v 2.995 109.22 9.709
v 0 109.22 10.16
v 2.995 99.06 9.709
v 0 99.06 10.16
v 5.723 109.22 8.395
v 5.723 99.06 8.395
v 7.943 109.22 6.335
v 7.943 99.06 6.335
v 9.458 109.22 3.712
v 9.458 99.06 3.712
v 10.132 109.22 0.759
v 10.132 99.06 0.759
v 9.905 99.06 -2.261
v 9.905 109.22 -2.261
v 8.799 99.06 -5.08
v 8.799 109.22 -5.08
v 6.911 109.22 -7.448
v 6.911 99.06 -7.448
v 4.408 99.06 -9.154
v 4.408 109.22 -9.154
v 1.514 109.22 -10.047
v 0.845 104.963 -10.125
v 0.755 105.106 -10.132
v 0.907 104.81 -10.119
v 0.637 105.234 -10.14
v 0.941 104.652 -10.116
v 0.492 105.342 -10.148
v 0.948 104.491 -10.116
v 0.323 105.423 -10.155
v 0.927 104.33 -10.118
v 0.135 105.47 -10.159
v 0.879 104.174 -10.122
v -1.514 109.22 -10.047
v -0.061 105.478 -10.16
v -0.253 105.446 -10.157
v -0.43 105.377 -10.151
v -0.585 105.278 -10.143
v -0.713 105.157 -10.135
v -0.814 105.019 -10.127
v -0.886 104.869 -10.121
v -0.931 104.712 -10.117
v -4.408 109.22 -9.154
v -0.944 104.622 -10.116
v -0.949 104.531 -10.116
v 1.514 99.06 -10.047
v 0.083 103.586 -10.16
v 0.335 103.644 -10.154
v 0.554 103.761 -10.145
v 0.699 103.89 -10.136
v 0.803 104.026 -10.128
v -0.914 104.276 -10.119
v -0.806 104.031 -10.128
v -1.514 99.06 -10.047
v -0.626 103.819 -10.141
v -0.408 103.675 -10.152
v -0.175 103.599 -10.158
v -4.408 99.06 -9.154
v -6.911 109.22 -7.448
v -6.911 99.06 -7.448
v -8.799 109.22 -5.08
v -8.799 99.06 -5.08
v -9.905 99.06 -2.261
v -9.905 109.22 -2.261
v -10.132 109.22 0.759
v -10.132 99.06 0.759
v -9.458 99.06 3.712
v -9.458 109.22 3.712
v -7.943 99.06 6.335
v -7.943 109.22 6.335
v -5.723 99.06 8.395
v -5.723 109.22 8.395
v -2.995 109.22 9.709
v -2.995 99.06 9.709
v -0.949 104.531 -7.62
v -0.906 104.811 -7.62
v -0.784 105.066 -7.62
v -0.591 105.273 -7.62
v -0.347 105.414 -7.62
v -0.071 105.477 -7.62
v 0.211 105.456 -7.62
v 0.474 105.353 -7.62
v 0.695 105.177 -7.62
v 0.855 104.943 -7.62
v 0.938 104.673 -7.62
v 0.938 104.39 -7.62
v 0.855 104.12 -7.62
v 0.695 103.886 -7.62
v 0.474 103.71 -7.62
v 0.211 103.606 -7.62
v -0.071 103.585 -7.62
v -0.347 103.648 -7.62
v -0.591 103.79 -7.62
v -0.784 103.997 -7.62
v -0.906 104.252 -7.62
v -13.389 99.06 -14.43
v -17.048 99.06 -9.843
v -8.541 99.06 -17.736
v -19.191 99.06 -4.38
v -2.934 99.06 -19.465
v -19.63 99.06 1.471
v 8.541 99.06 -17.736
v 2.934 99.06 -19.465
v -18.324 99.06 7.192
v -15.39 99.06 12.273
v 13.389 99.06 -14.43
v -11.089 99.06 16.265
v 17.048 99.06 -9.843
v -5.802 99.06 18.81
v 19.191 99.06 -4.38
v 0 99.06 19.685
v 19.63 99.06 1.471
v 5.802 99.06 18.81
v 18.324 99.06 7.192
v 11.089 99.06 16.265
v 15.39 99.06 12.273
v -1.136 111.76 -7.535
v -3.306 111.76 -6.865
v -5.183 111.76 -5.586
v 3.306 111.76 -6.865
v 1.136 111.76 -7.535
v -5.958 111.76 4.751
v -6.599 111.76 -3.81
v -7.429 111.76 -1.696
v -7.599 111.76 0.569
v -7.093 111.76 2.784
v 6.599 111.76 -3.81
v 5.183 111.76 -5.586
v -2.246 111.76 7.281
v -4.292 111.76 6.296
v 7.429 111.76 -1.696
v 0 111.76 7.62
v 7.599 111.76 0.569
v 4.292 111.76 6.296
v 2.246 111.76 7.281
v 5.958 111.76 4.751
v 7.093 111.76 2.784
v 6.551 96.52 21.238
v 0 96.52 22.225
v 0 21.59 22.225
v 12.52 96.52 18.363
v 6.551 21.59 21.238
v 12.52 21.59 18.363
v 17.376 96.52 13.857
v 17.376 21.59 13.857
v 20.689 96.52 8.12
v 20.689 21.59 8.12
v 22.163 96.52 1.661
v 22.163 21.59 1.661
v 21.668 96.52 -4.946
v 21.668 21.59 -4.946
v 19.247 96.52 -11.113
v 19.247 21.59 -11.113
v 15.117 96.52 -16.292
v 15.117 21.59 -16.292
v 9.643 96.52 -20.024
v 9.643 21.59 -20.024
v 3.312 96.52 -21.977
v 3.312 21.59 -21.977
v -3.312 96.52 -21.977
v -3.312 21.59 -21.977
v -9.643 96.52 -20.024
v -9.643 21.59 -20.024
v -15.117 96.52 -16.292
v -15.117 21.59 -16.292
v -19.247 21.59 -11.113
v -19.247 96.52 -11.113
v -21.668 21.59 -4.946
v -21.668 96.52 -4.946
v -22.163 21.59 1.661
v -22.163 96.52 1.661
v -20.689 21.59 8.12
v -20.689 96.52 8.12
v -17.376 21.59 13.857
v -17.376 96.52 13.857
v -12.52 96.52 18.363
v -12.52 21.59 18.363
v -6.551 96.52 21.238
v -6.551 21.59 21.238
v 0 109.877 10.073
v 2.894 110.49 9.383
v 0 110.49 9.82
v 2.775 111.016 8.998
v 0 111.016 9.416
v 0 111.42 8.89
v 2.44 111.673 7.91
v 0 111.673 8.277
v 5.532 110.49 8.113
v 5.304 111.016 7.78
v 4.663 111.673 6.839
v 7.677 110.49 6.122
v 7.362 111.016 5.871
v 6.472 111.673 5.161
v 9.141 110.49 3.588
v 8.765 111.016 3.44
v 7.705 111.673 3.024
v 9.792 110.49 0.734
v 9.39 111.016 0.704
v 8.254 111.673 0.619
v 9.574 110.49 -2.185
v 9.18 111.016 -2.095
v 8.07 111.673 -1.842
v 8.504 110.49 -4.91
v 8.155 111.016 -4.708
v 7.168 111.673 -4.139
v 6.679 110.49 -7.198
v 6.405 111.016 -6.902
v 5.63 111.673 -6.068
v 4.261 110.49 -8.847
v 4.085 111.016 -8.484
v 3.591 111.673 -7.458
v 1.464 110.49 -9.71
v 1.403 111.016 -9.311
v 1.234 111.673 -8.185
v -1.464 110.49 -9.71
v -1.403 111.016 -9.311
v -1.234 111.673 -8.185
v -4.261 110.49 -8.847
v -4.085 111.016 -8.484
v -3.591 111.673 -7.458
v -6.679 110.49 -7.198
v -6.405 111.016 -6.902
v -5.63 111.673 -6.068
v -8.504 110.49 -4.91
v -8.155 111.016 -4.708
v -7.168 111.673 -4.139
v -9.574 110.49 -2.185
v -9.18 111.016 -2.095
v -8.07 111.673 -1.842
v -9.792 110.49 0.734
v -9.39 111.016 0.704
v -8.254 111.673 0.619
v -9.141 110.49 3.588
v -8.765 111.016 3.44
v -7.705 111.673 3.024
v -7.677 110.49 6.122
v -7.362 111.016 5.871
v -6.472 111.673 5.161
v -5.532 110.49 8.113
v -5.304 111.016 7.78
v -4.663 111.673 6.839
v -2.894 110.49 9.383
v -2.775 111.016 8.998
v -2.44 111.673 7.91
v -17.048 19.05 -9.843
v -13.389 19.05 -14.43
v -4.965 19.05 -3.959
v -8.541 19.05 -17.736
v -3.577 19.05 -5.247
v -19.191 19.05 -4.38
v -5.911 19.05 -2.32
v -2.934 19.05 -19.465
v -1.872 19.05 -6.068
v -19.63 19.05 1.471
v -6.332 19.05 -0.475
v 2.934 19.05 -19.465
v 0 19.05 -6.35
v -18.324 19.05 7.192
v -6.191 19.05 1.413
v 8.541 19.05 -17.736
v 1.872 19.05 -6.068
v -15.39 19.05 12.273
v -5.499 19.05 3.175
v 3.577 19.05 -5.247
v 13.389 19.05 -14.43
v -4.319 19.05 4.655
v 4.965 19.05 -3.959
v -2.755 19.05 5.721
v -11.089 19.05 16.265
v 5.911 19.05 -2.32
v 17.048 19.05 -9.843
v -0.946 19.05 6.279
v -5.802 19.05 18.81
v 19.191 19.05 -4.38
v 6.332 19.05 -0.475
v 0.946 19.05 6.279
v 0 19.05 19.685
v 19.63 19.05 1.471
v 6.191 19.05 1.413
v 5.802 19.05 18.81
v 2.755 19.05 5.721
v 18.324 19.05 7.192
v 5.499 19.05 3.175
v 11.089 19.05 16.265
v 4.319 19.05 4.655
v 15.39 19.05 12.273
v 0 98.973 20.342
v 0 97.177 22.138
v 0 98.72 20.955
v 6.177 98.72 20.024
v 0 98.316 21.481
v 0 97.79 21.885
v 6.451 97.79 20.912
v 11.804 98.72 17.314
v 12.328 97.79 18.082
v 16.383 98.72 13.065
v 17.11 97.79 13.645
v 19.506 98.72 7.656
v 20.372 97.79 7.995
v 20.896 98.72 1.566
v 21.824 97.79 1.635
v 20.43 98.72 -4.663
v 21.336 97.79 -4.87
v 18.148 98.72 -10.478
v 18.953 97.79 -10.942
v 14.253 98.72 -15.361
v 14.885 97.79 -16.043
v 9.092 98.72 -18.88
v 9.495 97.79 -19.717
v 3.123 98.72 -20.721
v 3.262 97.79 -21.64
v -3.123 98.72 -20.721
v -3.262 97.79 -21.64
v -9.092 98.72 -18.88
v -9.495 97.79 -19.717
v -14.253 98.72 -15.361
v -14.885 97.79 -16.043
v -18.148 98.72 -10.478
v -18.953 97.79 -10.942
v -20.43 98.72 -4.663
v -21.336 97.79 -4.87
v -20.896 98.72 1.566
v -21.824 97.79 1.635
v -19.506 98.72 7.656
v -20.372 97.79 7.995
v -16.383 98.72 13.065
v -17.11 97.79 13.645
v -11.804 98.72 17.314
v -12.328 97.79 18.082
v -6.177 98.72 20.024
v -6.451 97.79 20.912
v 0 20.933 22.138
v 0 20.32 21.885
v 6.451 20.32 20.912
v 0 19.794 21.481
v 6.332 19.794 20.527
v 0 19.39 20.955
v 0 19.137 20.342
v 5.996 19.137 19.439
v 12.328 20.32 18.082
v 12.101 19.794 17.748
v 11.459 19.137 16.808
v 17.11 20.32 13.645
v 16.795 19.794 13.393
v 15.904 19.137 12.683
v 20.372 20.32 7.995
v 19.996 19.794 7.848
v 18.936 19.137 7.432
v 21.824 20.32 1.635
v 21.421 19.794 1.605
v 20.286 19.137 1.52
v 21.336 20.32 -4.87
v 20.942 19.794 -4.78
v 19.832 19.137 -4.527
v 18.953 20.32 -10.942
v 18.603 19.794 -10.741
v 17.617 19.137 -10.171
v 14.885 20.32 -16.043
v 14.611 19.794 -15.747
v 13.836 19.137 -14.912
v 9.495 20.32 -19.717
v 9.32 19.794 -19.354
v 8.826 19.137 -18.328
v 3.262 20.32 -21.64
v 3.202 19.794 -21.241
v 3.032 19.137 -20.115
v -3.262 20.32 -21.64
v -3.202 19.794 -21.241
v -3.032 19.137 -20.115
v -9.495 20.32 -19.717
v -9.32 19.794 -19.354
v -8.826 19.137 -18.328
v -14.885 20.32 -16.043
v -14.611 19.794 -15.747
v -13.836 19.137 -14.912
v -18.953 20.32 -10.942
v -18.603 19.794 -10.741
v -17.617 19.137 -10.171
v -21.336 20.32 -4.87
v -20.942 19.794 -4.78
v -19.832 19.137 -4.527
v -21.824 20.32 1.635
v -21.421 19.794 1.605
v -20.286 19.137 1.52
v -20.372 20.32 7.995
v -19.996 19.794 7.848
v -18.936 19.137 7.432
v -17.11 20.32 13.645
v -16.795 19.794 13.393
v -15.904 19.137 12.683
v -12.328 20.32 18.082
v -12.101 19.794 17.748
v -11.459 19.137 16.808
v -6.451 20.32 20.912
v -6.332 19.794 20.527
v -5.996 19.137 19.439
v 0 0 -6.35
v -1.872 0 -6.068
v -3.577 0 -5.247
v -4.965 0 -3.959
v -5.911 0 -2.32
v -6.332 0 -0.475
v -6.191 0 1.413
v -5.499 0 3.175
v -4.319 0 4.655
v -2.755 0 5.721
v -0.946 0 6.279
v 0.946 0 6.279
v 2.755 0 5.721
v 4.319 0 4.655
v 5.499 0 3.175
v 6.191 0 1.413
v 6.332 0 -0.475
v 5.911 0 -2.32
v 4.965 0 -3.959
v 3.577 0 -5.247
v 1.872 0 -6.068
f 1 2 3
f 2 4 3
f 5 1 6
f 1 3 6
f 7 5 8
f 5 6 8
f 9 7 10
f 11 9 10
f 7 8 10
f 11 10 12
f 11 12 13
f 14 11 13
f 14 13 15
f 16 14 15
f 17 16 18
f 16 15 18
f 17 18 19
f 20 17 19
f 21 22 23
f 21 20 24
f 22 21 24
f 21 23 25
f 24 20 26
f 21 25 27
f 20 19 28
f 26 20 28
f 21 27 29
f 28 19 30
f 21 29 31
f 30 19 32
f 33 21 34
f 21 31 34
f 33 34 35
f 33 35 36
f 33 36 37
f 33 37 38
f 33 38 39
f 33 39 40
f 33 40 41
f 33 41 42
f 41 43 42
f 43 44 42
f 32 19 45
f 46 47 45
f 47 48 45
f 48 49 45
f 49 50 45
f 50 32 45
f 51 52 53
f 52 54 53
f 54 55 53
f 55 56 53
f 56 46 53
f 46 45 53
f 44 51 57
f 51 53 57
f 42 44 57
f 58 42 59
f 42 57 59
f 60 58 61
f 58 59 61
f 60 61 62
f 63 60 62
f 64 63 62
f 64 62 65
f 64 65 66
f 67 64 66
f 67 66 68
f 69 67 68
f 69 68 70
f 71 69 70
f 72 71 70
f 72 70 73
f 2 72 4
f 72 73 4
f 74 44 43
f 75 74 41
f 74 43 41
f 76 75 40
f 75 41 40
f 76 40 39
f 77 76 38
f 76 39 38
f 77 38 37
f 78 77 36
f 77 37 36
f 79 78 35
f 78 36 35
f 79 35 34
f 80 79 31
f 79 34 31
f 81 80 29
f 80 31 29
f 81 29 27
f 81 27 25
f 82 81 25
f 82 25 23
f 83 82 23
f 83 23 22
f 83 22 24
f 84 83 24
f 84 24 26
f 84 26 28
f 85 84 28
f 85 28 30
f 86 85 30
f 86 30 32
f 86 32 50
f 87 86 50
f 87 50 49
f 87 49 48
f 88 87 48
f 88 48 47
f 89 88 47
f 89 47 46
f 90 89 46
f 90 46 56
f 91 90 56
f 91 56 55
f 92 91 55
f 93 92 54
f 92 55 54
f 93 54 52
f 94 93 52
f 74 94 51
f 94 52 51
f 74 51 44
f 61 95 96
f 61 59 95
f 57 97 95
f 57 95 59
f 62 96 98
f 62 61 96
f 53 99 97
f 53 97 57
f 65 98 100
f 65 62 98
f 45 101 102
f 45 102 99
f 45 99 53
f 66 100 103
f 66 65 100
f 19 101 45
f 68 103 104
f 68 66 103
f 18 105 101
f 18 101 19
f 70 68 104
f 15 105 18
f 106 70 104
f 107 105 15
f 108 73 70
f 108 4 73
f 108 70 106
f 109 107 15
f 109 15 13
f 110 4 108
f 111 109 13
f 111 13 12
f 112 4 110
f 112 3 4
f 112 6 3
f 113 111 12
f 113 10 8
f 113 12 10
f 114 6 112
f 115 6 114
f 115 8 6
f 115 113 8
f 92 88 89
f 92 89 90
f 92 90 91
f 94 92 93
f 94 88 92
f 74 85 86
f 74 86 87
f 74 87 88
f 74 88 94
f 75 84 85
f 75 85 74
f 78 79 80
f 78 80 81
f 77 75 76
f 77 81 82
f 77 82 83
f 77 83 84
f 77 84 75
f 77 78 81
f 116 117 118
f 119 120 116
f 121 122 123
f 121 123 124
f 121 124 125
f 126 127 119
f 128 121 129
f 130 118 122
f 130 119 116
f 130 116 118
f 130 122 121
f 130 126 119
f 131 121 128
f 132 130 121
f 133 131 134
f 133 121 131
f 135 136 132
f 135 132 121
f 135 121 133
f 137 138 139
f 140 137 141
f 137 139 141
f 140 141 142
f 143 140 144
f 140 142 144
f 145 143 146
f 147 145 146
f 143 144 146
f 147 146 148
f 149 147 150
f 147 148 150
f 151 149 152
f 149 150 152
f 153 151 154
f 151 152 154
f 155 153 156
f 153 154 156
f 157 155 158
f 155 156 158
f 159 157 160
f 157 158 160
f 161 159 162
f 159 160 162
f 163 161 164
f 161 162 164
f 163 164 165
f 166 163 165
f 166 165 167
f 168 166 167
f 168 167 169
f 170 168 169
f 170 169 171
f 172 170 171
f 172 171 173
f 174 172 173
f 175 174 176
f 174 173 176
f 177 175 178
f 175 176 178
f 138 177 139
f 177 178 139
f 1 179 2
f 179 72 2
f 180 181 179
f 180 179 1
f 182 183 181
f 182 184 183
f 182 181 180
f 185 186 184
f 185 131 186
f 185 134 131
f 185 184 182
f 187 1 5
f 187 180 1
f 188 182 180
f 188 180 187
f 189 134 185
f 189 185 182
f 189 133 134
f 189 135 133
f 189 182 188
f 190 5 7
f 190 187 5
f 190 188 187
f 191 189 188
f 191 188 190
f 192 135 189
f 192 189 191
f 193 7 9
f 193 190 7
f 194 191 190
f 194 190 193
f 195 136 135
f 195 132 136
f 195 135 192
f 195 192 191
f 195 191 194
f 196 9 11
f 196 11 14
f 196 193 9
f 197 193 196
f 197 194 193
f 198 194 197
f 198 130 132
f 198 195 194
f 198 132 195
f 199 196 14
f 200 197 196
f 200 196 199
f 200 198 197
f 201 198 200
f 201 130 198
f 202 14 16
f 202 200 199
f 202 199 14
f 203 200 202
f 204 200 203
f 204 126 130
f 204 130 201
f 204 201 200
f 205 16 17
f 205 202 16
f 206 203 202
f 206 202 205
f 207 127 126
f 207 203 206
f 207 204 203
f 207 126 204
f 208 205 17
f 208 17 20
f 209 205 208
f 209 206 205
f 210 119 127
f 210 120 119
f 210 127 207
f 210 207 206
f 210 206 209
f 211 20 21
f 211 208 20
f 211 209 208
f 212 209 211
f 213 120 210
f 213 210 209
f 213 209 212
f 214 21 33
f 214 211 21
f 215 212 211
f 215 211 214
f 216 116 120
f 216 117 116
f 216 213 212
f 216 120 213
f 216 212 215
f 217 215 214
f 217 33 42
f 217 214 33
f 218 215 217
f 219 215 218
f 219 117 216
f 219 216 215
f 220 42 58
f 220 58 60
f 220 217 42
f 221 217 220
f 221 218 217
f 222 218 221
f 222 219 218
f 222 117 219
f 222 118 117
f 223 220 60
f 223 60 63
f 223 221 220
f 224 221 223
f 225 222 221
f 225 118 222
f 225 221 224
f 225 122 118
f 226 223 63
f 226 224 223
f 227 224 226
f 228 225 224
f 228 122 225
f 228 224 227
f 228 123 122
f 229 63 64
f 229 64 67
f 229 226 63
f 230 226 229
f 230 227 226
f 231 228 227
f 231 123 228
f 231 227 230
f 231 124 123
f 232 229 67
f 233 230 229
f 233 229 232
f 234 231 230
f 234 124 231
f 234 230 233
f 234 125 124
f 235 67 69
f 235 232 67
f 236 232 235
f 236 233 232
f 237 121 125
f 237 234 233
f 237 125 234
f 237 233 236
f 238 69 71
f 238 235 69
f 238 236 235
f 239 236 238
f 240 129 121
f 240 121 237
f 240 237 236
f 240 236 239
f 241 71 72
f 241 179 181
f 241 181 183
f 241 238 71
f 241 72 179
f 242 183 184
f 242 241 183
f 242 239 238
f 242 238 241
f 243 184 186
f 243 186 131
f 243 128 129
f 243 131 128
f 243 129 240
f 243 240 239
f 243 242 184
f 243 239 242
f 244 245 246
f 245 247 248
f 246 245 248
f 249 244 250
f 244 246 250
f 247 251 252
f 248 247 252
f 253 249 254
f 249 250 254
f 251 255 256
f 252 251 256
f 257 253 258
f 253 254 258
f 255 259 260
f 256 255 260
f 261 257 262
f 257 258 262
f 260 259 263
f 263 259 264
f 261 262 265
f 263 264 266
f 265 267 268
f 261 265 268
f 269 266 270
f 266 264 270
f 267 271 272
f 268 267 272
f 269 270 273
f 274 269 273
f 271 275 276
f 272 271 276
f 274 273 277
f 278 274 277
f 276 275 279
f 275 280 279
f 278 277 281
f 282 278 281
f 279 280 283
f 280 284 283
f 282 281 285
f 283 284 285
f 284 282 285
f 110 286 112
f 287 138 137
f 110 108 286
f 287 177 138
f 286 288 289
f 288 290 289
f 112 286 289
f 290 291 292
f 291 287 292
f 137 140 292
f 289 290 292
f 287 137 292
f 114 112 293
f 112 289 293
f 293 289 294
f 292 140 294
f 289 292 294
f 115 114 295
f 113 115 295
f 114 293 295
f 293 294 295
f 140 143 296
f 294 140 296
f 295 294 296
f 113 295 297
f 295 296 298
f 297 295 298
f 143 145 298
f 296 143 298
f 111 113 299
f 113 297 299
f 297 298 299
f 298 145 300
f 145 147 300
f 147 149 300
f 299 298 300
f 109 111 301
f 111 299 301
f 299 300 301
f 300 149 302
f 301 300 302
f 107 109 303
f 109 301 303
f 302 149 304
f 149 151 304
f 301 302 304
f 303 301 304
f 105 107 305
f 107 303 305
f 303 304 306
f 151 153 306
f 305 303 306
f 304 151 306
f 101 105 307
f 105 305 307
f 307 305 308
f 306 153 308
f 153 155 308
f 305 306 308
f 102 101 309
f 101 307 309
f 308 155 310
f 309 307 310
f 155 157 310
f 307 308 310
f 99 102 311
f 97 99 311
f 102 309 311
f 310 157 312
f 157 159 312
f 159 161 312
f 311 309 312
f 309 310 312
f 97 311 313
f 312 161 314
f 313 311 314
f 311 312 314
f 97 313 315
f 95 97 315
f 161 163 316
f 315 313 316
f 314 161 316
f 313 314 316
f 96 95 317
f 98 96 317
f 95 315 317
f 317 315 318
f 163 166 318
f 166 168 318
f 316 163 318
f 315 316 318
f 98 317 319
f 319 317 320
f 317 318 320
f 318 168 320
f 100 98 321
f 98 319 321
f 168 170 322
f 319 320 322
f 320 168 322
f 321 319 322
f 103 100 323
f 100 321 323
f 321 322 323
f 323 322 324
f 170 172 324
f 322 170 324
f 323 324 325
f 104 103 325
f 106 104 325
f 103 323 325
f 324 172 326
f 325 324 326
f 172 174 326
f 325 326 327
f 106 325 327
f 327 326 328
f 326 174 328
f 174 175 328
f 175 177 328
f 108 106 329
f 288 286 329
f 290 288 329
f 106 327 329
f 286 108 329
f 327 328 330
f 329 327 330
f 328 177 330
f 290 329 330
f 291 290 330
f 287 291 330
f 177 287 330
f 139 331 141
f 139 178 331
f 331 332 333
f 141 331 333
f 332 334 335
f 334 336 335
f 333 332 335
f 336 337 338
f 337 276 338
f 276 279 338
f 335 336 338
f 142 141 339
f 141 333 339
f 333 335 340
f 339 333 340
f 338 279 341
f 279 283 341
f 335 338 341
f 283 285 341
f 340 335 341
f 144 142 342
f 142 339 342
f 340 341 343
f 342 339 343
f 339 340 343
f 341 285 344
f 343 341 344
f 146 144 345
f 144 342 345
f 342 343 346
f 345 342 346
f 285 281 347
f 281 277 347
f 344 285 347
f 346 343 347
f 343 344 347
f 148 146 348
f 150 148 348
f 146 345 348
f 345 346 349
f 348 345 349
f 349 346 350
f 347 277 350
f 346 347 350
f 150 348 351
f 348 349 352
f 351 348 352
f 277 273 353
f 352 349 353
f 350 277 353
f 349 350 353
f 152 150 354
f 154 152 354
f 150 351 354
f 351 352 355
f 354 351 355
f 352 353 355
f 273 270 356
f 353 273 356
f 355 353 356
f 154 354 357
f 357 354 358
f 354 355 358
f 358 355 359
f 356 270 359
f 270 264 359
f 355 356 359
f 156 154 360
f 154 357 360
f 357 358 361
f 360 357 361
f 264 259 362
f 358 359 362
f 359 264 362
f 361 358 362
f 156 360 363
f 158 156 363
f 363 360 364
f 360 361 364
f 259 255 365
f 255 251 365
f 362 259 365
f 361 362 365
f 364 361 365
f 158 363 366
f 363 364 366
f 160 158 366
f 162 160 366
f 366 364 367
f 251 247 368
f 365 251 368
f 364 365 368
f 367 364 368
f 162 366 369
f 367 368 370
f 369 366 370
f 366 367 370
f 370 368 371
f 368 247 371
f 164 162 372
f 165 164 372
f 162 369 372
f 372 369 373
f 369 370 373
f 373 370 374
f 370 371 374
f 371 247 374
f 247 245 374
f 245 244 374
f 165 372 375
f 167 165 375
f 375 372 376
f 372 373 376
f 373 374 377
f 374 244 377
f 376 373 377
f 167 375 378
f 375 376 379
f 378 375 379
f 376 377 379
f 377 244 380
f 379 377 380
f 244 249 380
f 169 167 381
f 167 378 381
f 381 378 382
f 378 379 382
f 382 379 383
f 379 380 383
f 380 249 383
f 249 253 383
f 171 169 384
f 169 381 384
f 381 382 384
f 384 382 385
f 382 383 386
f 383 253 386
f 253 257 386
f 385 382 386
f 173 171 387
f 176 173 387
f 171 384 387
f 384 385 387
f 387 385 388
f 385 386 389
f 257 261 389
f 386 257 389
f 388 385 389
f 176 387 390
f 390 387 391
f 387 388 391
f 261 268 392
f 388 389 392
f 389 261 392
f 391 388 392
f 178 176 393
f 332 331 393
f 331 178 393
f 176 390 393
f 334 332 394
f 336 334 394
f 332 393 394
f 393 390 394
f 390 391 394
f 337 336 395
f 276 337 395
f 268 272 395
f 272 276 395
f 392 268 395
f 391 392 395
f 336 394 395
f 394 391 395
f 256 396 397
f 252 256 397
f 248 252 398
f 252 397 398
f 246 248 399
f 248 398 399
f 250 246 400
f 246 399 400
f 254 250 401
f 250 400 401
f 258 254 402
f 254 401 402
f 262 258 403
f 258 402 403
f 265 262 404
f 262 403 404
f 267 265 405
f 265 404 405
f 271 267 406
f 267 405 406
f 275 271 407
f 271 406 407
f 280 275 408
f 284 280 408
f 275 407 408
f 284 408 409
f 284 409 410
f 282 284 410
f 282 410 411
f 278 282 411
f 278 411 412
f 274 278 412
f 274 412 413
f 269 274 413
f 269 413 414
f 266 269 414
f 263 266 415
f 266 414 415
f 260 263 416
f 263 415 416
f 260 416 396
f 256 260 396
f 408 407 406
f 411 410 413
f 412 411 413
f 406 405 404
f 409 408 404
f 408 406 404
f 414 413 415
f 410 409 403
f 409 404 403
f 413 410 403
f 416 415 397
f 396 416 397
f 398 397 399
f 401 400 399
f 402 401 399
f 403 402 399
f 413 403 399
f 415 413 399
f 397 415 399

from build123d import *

# Parameters (mm, degrees)
SKETCH1_R           = 6.35
BOSS_EXTRUDE1_DEPTH = 19.05
SKETCH3_R           = 22.225
BOSS_EXTRUDE2_DEPTH = 80.01
SKETCH4_R           = 10.16
BOSS_EXTRUDE3_DEPTH = 12.7
FILLET2_R           = 2.54
FILLET3_R           = 2.54
FILLET4_R           = 2.54
SKETCH5_R           = 0.948603759
CUT_EXTRUDE1_DEPTH  = 2.54


with BuildPart() as part:
    # Sketch1 → Boss-Extrude1 (new body)
    with BuildSketch(Plane(origin=(0, 0, 0), x_dir=(1, 0, 0), z_dir=(0, 1, 0))):
        with Locations(Location((0, 0, 0), (0, 0, 90))):
            Circle(SKETCH1_R)
    extrude(amount=BOSS_EXTRUDE1_DEPTH)

    # Sketch3 → Boss-Extrude2 (add)
    with BuildSketch(Plane(origin=(0, 19.05, 0), x_dir=(1, 0, 0), z_dir=(0, 1, 0))):
        with Locations(Location((0, 0, 0), (0, 0, 270))):
            Circle(SKETCH3_R)
    extrude(amount=BOSS_EXTRUDE2_DEPTH)

    # Sketch4 → Boss-Extrude3 (add)
    with BuildSketch(Plane(origin=(0, 99.06, 0), x_dir=(1, 0, 0), z_dir=(0, 1, 0))):
        with Locations(Location((0, 0, 0), (0, 0, 270))):
            Circle(SKETCH4_R)
    extrude(amount=BOSS_EXTRUDE3_DEPTH)

    # Fillet2
    fillet2_edges = [part.edges().sort_by_distance(p)[0] for p in [
        (0, 111.76, -10.16),
    ]]
    fillet(fillet2_edges, radius=FILLET2_R)

    # Fillet3
    fillet3_edges = [part.edges().sort_by_distance(p)[0] for p in [
        (0, 99.06, -22.225),
    ]]
    fillet(fillet3_edges, radius=FILLET3_R)

    # Fillet4
    fillet4_edges = [part.edges().sort_by_distance(p)[0] for p in [
        (0, 19.05, -22.225),
    ]]
    fillet(fillet4_edges, radius=FILLET4_R)

    # Sketch5 → Cut-Extrude1 (cut)
    with BuildSketch(Plane(origin=(0, 0, -10.16), x_dir=(-1, 0, 0), z_dir=(0, 0, -1))):
        with Locations((0, 104.531305945)):
            Circle(SKETCH5_R)
    extrude(amount=-CUT_EXTRUDE1_DEPTH, mode=Mode.SUBTRACT)


solid = part.part
